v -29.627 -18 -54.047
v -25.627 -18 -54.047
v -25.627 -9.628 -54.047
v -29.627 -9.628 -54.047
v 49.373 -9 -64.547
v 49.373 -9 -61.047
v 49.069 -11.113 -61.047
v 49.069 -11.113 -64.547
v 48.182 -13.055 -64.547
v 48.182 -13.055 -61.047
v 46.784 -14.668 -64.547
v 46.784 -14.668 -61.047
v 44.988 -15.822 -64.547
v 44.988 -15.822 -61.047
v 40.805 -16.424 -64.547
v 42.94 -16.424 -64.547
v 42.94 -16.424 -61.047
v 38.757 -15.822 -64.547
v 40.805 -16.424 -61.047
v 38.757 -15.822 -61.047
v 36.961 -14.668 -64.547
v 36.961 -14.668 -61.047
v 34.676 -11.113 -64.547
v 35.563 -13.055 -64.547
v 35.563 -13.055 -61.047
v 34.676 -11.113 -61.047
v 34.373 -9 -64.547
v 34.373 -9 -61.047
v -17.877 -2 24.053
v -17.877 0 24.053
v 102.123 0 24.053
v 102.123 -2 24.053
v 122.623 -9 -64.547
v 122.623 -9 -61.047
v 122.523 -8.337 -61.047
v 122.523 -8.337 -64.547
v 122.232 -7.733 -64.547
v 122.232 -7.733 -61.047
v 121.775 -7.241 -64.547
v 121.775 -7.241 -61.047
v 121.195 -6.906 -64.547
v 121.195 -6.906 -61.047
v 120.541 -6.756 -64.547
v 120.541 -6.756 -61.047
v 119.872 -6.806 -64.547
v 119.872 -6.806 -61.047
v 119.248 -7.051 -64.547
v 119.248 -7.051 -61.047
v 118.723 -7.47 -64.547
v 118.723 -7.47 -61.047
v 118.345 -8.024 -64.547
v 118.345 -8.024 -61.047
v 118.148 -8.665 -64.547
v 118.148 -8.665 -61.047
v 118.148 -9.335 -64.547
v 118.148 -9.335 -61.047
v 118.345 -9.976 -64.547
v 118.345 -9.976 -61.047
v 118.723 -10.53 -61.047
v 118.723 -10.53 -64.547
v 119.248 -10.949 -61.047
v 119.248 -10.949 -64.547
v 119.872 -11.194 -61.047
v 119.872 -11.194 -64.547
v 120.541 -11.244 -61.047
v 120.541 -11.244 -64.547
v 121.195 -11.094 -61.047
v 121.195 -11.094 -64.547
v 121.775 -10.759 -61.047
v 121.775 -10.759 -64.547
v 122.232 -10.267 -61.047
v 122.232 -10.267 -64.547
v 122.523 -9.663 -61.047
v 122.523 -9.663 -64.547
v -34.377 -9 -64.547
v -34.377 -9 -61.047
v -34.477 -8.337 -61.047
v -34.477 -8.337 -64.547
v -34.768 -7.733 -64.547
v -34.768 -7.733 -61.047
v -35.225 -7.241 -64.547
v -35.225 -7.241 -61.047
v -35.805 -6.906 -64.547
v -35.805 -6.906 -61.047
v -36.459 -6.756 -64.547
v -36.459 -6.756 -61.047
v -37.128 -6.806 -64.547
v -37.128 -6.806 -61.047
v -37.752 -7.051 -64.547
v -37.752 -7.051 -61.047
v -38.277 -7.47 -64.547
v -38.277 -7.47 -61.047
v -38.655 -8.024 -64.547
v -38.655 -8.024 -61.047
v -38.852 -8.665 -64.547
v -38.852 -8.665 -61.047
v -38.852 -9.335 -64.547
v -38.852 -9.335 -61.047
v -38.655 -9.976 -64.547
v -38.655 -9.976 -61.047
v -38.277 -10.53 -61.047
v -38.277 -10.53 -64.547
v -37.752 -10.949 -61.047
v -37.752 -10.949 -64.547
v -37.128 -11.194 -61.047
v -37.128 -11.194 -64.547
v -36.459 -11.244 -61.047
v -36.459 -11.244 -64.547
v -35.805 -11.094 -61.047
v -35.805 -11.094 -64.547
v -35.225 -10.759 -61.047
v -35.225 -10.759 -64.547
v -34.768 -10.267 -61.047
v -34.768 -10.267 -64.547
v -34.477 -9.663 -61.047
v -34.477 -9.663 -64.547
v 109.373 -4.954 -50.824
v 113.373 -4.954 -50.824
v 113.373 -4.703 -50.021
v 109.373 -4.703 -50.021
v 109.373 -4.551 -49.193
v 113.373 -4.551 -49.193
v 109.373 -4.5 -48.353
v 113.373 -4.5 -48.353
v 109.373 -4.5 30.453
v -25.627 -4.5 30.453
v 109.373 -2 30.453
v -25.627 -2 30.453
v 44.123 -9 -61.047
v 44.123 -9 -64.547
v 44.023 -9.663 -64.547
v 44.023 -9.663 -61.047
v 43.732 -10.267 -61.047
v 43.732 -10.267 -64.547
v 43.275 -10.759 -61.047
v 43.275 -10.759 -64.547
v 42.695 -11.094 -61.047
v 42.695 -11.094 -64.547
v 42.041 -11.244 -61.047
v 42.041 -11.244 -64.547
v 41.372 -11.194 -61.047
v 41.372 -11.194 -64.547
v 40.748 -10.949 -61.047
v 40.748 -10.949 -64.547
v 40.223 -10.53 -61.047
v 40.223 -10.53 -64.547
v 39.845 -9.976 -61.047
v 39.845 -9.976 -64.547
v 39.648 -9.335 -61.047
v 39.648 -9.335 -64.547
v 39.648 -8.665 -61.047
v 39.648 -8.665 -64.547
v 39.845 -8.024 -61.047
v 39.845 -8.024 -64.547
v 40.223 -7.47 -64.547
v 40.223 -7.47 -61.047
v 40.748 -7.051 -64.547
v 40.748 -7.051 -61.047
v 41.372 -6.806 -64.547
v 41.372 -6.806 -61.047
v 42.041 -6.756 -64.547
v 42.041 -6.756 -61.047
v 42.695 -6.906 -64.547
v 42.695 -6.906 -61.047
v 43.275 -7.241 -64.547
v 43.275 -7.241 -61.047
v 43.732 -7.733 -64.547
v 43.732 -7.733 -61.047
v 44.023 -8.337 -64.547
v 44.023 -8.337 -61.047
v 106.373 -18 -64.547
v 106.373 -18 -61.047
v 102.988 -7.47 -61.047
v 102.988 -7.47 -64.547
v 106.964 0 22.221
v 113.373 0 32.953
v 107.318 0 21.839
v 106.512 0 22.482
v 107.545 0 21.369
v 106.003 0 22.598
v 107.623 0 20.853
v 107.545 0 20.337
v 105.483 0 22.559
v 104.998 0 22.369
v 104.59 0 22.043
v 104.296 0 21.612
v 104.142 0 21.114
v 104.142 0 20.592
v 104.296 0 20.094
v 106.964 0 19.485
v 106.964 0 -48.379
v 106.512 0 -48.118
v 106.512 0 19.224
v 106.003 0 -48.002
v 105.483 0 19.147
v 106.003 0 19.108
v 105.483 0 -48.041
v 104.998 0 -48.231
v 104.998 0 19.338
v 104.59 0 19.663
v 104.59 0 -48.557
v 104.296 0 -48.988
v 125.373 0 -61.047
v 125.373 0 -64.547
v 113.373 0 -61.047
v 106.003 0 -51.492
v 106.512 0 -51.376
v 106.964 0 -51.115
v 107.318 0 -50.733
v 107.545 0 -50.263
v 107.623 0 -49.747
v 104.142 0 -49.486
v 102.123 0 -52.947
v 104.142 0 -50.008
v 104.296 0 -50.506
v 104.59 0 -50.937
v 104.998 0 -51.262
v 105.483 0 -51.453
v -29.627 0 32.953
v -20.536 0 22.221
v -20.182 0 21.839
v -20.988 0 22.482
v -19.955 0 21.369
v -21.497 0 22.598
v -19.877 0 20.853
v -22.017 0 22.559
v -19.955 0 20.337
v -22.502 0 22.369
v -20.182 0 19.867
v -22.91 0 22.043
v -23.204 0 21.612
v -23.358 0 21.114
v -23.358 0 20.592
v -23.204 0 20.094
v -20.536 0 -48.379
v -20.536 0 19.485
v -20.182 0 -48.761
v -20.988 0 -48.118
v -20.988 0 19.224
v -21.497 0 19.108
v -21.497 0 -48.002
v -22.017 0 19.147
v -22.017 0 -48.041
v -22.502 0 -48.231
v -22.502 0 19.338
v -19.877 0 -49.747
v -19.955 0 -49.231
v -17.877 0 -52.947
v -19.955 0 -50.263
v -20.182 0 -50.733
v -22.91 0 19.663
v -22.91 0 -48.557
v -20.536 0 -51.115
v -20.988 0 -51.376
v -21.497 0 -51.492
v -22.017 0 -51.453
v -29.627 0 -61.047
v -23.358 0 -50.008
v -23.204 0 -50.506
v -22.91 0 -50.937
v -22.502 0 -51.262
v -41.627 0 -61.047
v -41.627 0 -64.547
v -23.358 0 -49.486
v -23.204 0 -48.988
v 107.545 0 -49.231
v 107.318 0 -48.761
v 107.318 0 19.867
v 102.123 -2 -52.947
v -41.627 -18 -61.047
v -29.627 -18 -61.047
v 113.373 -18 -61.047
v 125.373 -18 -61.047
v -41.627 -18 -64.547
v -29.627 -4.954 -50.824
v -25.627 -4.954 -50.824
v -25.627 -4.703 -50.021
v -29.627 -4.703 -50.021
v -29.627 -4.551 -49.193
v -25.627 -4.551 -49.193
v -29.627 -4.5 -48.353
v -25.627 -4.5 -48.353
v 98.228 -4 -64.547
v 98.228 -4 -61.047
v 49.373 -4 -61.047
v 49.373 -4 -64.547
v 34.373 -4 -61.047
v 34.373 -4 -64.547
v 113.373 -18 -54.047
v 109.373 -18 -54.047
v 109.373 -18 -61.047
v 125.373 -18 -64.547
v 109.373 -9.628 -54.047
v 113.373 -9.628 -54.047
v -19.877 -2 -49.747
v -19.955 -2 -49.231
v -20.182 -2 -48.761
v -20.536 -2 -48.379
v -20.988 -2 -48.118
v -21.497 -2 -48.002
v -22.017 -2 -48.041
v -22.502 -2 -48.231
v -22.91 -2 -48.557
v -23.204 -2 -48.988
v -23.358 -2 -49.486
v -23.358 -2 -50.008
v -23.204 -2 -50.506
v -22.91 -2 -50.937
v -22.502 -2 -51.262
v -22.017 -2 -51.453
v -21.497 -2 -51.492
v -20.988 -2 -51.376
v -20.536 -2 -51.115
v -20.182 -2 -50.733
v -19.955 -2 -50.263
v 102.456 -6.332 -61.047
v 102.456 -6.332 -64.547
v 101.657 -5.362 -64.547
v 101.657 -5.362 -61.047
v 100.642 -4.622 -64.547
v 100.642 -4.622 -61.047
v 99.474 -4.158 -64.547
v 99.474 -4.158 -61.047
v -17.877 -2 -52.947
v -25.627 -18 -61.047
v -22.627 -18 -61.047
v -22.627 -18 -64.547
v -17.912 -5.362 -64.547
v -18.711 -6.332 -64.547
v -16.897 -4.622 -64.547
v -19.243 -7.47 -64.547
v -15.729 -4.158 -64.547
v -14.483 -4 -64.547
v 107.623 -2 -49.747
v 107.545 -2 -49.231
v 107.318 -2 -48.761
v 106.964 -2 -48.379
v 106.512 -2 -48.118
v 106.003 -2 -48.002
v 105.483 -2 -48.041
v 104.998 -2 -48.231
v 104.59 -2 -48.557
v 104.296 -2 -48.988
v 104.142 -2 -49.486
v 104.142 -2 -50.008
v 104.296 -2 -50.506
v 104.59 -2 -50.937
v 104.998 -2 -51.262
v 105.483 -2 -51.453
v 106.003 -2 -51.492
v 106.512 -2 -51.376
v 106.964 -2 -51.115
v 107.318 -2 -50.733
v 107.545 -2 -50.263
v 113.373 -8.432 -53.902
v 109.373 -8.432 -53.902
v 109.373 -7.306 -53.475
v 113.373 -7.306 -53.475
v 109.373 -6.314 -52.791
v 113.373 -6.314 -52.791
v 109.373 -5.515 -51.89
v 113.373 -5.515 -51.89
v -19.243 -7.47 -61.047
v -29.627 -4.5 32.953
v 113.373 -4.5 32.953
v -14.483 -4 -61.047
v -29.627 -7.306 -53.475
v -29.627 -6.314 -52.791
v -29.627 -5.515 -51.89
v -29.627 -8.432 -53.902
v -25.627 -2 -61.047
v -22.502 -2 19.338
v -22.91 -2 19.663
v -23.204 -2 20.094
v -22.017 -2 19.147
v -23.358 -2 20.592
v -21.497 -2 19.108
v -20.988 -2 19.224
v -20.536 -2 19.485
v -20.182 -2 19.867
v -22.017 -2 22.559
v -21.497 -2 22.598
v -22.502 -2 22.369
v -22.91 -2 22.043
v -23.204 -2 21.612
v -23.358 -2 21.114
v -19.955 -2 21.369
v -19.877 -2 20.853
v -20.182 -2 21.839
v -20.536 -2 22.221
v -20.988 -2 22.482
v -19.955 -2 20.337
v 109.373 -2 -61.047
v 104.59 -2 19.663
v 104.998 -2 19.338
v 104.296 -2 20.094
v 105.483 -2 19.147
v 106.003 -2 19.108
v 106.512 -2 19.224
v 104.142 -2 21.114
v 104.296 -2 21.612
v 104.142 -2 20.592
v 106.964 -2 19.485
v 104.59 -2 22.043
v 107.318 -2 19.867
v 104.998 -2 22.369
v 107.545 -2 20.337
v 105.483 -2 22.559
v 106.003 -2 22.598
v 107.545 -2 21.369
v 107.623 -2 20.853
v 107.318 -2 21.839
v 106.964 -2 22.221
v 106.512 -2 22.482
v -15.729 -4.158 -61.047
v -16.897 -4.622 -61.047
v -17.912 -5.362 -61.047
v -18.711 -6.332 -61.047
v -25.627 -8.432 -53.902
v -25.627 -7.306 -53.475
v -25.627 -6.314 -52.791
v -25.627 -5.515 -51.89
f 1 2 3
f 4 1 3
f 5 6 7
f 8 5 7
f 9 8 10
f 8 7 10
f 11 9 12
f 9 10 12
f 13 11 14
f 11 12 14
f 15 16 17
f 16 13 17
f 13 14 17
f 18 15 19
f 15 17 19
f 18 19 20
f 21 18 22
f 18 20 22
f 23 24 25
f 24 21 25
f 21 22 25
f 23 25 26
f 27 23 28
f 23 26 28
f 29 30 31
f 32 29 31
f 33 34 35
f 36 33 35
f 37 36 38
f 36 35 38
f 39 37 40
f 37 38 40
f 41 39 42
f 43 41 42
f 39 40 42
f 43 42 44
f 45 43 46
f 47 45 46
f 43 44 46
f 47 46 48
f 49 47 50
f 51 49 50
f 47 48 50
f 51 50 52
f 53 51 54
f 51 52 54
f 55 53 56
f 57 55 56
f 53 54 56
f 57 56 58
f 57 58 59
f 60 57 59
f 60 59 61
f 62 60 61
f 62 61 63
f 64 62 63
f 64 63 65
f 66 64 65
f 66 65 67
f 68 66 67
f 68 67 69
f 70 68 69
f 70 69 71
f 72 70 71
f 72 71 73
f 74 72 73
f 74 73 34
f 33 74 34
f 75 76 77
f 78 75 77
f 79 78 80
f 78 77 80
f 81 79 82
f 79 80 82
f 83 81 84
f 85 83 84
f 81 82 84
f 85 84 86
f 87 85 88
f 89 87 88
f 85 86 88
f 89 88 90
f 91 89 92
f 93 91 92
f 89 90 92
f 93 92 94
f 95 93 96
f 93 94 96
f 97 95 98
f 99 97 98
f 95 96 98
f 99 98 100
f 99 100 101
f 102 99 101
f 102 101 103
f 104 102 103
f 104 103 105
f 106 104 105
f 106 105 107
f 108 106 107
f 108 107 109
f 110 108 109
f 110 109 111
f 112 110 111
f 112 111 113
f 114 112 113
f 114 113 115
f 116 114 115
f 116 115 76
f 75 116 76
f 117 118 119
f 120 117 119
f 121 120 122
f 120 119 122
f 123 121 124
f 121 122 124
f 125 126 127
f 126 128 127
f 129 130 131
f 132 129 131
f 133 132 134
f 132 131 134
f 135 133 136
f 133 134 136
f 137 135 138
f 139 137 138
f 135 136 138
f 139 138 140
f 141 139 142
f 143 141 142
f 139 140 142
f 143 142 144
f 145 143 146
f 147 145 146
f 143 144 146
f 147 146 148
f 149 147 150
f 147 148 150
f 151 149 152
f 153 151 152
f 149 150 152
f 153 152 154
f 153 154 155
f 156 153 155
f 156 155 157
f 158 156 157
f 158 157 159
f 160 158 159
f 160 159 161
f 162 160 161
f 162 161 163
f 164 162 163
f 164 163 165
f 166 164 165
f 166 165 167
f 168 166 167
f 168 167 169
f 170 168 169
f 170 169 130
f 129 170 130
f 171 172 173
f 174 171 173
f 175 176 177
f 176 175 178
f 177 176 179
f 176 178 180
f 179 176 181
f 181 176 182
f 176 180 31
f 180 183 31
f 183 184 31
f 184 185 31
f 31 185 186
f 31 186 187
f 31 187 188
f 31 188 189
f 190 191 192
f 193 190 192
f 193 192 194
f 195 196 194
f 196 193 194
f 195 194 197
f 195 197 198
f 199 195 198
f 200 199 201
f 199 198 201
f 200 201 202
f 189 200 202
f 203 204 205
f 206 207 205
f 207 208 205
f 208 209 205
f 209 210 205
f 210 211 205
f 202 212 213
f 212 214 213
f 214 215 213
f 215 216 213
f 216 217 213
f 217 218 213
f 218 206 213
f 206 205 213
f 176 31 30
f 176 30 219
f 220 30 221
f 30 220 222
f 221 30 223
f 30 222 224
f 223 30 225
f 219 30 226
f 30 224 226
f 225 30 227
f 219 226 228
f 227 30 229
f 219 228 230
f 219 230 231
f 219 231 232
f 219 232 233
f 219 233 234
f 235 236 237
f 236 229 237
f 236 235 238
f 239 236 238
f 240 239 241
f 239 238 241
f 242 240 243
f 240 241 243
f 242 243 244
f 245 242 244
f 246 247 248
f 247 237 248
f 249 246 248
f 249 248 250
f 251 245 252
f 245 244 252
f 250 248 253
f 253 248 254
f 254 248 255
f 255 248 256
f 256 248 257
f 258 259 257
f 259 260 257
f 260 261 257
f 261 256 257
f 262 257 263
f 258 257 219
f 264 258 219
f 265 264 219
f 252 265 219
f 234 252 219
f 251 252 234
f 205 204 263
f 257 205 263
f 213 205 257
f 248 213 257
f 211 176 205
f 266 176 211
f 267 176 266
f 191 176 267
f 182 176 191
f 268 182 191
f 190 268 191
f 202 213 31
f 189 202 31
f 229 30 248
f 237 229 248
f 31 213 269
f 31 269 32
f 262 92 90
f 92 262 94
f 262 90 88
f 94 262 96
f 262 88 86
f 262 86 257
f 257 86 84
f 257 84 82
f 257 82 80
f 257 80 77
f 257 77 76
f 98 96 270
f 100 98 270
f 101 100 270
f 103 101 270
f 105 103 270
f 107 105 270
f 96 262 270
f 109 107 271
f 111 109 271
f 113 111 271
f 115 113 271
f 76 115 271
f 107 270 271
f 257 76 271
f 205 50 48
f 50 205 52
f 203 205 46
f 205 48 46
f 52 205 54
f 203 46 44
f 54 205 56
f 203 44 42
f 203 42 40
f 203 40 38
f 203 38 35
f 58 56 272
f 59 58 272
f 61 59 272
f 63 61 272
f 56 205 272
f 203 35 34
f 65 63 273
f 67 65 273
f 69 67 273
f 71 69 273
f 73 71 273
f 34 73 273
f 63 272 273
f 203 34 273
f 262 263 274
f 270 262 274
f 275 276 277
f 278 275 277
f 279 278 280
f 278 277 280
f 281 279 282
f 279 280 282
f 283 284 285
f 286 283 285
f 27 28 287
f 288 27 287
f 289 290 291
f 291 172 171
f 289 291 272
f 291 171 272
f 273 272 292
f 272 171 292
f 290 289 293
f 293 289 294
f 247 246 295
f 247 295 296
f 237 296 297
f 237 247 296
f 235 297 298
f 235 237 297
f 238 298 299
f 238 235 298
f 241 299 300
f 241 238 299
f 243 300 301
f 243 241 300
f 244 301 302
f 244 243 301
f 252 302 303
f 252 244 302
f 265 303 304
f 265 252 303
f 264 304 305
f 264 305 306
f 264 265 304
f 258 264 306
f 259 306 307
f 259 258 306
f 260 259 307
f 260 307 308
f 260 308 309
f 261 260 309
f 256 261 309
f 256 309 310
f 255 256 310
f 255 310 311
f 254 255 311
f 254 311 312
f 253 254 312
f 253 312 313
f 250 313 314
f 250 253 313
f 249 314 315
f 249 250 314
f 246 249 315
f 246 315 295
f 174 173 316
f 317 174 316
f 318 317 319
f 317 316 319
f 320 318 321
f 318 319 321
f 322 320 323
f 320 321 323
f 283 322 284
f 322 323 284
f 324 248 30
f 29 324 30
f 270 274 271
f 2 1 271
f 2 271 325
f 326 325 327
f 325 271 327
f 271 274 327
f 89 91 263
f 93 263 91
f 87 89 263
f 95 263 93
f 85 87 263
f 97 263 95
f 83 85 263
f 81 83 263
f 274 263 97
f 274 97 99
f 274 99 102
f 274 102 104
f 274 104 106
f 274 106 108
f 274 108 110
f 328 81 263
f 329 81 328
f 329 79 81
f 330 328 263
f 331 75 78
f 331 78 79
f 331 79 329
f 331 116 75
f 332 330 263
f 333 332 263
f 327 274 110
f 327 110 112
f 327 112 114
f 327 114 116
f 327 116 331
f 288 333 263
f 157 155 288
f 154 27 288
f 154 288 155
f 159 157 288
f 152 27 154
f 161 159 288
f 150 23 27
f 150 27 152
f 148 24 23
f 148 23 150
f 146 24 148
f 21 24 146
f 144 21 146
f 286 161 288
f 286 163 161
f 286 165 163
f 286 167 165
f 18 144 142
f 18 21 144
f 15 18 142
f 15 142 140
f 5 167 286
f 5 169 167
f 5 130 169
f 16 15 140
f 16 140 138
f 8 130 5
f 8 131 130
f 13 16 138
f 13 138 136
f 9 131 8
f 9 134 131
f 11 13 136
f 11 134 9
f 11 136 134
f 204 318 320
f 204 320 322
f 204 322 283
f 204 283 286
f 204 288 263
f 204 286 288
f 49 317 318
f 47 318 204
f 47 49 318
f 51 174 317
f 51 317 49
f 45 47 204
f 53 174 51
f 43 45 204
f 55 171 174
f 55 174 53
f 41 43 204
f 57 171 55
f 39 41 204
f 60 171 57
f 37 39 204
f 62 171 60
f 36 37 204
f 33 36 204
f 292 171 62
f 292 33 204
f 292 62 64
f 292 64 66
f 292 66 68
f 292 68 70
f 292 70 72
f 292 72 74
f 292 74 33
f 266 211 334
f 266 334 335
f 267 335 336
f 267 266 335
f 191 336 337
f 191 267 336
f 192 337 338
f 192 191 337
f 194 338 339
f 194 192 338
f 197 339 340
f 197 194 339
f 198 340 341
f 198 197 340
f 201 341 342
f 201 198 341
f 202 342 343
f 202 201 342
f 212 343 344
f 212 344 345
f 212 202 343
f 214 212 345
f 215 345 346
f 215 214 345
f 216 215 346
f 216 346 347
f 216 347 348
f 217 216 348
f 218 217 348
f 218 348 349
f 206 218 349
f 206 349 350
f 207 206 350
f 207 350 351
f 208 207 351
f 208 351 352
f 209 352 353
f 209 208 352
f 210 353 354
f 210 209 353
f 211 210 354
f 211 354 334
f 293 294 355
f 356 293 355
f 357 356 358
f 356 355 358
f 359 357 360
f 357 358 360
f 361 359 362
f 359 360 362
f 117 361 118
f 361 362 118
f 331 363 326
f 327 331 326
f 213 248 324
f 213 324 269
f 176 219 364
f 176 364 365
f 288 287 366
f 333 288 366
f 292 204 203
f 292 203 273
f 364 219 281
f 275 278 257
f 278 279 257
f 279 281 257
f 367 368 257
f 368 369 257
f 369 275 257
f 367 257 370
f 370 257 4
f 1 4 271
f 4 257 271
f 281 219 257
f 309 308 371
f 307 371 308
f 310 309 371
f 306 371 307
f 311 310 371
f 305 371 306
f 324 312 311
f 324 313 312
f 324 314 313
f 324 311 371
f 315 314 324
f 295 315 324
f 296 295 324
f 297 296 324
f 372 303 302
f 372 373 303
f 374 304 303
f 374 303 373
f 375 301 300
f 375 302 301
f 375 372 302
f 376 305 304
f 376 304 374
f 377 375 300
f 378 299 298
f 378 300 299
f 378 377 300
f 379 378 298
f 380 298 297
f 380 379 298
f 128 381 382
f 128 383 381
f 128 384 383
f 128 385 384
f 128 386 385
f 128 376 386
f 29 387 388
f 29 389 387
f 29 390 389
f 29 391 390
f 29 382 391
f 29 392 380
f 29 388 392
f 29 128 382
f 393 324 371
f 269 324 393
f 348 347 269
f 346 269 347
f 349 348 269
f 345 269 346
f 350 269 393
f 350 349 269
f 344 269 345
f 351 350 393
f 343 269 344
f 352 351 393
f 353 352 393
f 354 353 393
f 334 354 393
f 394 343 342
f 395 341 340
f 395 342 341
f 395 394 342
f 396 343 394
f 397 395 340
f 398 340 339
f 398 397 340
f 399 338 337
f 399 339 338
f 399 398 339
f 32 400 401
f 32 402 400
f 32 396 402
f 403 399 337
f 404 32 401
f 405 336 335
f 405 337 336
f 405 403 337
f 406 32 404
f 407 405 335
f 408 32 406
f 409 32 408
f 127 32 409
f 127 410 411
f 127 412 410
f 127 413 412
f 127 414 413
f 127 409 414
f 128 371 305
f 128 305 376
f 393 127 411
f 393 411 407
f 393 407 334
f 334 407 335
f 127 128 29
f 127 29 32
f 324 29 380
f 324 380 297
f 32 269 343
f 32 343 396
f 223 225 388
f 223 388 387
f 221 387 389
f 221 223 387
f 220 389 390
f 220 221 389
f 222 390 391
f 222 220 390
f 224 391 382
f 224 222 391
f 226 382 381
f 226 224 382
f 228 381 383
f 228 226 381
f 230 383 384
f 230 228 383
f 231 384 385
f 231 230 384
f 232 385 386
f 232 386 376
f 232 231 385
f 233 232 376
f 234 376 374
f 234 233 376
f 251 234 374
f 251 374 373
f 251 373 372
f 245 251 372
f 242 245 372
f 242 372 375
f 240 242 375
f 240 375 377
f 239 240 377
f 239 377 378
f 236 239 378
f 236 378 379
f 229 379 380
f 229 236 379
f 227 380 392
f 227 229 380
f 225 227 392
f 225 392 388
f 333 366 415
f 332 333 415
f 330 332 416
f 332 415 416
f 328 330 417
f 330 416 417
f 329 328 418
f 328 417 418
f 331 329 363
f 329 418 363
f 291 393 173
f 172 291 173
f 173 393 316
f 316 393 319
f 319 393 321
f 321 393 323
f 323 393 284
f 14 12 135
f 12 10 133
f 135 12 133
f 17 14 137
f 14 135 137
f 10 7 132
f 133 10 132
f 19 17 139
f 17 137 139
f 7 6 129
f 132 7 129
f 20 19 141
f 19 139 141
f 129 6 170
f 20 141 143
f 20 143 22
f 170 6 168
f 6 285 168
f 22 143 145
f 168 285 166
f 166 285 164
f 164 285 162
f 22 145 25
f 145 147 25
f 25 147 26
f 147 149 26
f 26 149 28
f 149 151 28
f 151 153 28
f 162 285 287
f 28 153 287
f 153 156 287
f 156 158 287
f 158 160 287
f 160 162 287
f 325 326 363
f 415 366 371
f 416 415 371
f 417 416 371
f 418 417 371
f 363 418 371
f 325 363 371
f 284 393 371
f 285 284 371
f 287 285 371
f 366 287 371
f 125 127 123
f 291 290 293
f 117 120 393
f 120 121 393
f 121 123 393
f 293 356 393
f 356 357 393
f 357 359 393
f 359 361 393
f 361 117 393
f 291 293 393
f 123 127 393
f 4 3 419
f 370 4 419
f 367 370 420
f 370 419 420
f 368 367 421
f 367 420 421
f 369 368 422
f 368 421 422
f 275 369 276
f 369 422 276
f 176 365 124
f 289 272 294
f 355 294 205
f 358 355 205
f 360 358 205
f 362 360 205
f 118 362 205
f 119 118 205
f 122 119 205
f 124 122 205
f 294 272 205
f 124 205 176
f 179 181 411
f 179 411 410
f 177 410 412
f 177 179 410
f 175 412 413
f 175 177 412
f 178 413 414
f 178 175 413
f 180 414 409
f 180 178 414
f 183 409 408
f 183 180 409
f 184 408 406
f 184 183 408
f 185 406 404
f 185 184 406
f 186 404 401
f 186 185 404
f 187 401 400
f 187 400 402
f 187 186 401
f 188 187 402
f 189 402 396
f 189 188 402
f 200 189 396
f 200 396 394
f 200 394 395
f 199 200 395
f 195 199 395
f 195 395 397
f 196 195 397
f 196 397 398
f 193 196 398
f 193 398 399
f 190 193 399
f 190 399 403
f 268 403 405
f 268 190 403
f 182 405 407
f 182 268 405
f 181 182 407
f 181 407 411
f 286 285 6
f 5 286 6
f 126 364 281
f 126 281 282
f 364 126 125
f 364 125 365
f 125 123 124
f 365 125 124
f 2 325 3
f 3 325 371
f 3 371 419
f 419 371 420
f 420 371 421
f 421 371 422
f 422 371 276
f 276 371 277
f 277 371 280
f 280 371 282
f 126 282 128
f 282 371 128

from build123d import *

# Parameters (mm, degrees)
F0_W      = 135
F0_H      = 90
F0_R      = 1.75
F0_W_2    = 120
F0_H_2    = 77
F1_DEPTH  = 2
F2_DEPTH  = 18
F3_R      = 2.25
F4_DEPTH  = 25
F5_DEPTH  = 1.5
F7_DEPTH  = 143.001
F8_W      = 12
F8_H      = 18
F9_DEPTH  = 3.5
F10_R     = 2.25
F11_DEPTH = 3.501
F12_R     = 2.25
F13_DEPTH = 3.501
F14_W     = 135
F14_H     = 2.5
F15_DEPTH = 2.5


# Not quite as in the source:
# - a feature names something its author has since deleted; it is built from what else it names


with BuildPart() as f1:
    # F0 (on Front) → F1 (new body)
    with BuildSketch(Plane.XZ):
        with Locations((41.872507602, -14.5468179137)):
            Rectangle(F0_W, F0_H)
        with Locations((-21.627492398, -49.7468179137)):
            Circle(F0_R, mode=Mode.SUBTRACT)
        with Locations((105.872507602, -49.7468179137)):
            Circle(F0_R, mode=Mode.SUBTRACT)
        with Locations((-21.627492398, 20.8531820863)):
            Circle(F0_R, mode=Mode.SUBTRACT)
        with Locations((42.122507602, -14.4468179137)):
            Rectangle(F0_W_2, F0_H_2, mode=Mode.SUBTRACT)
        with Locations((105.872507602, 20.8531820863)):
            Circle(F0_R, mode=Mode.SUBTRACT)
    extrude(amount=F1_DEPTH)

    # F0 (on Front) → F2 (join)
    with BuildSketch(Plane.XZ):
        Polygon((-25.627492398, -59.5468179137), (-25.627492398, 30.4531820863), (-29.627492398, 30.4531820863), (-29.627492398, -64.5468179137), (113.372507602, -64.5468179137), (113.372507602, 30.4531820863), (109.372507602, 30.4531820863), (109.372507602, -59.5468179137), align=None)
    extrude(amount=F2_DEPTH)

    # F3 (on face) → F4 (cut)
    with BuildSketch(Plane(origin=(0, 0, -64.5468179137), x_dir=(1, 0, 0), z_dir=(0, 0, -1))):
        with Locations((-9.627492398, 9)):
            Circle(F3_R)
        with Locations((41.872507602, 9)):
            Circle(F3_R)
        with Locations((93.372507602, 9)):
            Circle(F3_R)
    extrude(amount=-F4_DEPTH, mode=Mode.SUBTRACT)

    # F5 (cut): a face of the model
    f5_faces = [f1.faces().sort_by_distance(p)[0] for p in [
        (41.872507602, -3.3594484176, -59.5468179137),
    ]]
    extrude(f5_faces, amount=-F5_DEPTH, mode=Mode.SUBTRACT)

    # F6 (on face) → F7 (cut, through all)
    with BuildSketch(Plane.YZ.offset(113.372507602)):
        with BuildLine():
            Line((-18, 30.4531820863), (-18, -54.0468179137))
            Line((-18, -54.0468179137), (-9.6275595227, -54.0468179137))
            ThreePointArc((-9.6275595227, -54.0468179137), (-6.7891073566, -53.1630284647), (-4.9540928207, -50.8240936338))
            ThreePointArc((-4.9540928207, -50.8240936338), (-4.6144653792, -49.6089954864), (-4.5, -48.3525290189))
            Line((-4.5, -48.3525290189), (-4.5, 30.4531820863))
            Line((-4.5, 30.4531820863), (-18, 30.4531820863))
        make_face()
    extrude(amount=-F7_DEPTH, mode=Mode.SUBTRACT)

    # F8 (on face) → F9 (join, through all)
    with BuildSketch(Plane(origin=(0, 0, -64.5468179137), x_dir=(1, 0, 0), z_dir=(0, 0, -1))):
        with Locations((-35.627492398, 9)):
            Rectangle(F8_W, F8_H)
        with Locations((119.372507602, 9)):
            Rectangle(F8_W, F8_H)
    extrude(amount=-F9_DEPTH)

    # F10 (on face) → F11 (cut, through all)
    with BuildSketch(Plane.XY.offset(-61.0468179137)):
        with Locations((-36.627492398, -9)):
            Circle(F10_R)
        with Locations((120.372507602, -9)):
            Circle(F10_R)
    extrude(amount=-F11_DEPTH, mode=Mode.SUBTRACT)

    # F12 (on face) → F13 (cut, through all)
    with BuildSketch(Plane.XY.offset(-61.0468179137)):
        with BuildLine():
            Line((34.372507602, -4), (-14.4826919802, -4))
            ThreePointArc((-14.4826919802, -4), (-17.4280077943, -4.959565029), (-19.2428347866, -7.4699540979))
            Line((-19.2428347866, -7.4699540979), (-22.627492398, -18))
            Line((-22.627492398, -18), (106.372507602, -18))
            Line((106.372507602, -18), (102.9878499906, -7.4699540979))
            ThreePointArc((102.9878499906, -7.4699540979), (101.1730229983, -4.959565029), (98.2277071842, -4))
            Line((98.2277071842, -4), (49.372507602, -4))
            Line((49.372507602, -4), (49.372507602, -9))
            ThreePointArc((49.372507602, -9), (41.872507602, -16.5), (34.372507602, -9))
            Line((34.372507602, -9), (34.372507602, -4))
        make_face()
        with Locations((-9.627492398, -9)):
            Circle(F12_R, mode=Mode.SUBTRACT)
        with Locations((93.372507602, -9)):
            Circle(F12_R, mode=Mode.SUBTRACT)
    extrude(amount=-F13_DEPTH, mode=Mode.SUBTRACT)

    # F14 (on face) → F15 (join)
    with BuildSketch(Plane.XY.offset(30.4531820863)):
        with Locations((41.872507602, -3.25)):
            Rectangle(F14_W, F14_H)
        Polygon((-29.627492398, -4.5), (-25.627492398, -4.5), (-25.627492398, -2), (109.372507602, -2), (109.372507602, -4.5), (113.372507602, -4.5), (113.372507602, 0), (-29.627492398, 0), align=None)
    extrude(amount=F15_DEPTH)


solid = f1.part
